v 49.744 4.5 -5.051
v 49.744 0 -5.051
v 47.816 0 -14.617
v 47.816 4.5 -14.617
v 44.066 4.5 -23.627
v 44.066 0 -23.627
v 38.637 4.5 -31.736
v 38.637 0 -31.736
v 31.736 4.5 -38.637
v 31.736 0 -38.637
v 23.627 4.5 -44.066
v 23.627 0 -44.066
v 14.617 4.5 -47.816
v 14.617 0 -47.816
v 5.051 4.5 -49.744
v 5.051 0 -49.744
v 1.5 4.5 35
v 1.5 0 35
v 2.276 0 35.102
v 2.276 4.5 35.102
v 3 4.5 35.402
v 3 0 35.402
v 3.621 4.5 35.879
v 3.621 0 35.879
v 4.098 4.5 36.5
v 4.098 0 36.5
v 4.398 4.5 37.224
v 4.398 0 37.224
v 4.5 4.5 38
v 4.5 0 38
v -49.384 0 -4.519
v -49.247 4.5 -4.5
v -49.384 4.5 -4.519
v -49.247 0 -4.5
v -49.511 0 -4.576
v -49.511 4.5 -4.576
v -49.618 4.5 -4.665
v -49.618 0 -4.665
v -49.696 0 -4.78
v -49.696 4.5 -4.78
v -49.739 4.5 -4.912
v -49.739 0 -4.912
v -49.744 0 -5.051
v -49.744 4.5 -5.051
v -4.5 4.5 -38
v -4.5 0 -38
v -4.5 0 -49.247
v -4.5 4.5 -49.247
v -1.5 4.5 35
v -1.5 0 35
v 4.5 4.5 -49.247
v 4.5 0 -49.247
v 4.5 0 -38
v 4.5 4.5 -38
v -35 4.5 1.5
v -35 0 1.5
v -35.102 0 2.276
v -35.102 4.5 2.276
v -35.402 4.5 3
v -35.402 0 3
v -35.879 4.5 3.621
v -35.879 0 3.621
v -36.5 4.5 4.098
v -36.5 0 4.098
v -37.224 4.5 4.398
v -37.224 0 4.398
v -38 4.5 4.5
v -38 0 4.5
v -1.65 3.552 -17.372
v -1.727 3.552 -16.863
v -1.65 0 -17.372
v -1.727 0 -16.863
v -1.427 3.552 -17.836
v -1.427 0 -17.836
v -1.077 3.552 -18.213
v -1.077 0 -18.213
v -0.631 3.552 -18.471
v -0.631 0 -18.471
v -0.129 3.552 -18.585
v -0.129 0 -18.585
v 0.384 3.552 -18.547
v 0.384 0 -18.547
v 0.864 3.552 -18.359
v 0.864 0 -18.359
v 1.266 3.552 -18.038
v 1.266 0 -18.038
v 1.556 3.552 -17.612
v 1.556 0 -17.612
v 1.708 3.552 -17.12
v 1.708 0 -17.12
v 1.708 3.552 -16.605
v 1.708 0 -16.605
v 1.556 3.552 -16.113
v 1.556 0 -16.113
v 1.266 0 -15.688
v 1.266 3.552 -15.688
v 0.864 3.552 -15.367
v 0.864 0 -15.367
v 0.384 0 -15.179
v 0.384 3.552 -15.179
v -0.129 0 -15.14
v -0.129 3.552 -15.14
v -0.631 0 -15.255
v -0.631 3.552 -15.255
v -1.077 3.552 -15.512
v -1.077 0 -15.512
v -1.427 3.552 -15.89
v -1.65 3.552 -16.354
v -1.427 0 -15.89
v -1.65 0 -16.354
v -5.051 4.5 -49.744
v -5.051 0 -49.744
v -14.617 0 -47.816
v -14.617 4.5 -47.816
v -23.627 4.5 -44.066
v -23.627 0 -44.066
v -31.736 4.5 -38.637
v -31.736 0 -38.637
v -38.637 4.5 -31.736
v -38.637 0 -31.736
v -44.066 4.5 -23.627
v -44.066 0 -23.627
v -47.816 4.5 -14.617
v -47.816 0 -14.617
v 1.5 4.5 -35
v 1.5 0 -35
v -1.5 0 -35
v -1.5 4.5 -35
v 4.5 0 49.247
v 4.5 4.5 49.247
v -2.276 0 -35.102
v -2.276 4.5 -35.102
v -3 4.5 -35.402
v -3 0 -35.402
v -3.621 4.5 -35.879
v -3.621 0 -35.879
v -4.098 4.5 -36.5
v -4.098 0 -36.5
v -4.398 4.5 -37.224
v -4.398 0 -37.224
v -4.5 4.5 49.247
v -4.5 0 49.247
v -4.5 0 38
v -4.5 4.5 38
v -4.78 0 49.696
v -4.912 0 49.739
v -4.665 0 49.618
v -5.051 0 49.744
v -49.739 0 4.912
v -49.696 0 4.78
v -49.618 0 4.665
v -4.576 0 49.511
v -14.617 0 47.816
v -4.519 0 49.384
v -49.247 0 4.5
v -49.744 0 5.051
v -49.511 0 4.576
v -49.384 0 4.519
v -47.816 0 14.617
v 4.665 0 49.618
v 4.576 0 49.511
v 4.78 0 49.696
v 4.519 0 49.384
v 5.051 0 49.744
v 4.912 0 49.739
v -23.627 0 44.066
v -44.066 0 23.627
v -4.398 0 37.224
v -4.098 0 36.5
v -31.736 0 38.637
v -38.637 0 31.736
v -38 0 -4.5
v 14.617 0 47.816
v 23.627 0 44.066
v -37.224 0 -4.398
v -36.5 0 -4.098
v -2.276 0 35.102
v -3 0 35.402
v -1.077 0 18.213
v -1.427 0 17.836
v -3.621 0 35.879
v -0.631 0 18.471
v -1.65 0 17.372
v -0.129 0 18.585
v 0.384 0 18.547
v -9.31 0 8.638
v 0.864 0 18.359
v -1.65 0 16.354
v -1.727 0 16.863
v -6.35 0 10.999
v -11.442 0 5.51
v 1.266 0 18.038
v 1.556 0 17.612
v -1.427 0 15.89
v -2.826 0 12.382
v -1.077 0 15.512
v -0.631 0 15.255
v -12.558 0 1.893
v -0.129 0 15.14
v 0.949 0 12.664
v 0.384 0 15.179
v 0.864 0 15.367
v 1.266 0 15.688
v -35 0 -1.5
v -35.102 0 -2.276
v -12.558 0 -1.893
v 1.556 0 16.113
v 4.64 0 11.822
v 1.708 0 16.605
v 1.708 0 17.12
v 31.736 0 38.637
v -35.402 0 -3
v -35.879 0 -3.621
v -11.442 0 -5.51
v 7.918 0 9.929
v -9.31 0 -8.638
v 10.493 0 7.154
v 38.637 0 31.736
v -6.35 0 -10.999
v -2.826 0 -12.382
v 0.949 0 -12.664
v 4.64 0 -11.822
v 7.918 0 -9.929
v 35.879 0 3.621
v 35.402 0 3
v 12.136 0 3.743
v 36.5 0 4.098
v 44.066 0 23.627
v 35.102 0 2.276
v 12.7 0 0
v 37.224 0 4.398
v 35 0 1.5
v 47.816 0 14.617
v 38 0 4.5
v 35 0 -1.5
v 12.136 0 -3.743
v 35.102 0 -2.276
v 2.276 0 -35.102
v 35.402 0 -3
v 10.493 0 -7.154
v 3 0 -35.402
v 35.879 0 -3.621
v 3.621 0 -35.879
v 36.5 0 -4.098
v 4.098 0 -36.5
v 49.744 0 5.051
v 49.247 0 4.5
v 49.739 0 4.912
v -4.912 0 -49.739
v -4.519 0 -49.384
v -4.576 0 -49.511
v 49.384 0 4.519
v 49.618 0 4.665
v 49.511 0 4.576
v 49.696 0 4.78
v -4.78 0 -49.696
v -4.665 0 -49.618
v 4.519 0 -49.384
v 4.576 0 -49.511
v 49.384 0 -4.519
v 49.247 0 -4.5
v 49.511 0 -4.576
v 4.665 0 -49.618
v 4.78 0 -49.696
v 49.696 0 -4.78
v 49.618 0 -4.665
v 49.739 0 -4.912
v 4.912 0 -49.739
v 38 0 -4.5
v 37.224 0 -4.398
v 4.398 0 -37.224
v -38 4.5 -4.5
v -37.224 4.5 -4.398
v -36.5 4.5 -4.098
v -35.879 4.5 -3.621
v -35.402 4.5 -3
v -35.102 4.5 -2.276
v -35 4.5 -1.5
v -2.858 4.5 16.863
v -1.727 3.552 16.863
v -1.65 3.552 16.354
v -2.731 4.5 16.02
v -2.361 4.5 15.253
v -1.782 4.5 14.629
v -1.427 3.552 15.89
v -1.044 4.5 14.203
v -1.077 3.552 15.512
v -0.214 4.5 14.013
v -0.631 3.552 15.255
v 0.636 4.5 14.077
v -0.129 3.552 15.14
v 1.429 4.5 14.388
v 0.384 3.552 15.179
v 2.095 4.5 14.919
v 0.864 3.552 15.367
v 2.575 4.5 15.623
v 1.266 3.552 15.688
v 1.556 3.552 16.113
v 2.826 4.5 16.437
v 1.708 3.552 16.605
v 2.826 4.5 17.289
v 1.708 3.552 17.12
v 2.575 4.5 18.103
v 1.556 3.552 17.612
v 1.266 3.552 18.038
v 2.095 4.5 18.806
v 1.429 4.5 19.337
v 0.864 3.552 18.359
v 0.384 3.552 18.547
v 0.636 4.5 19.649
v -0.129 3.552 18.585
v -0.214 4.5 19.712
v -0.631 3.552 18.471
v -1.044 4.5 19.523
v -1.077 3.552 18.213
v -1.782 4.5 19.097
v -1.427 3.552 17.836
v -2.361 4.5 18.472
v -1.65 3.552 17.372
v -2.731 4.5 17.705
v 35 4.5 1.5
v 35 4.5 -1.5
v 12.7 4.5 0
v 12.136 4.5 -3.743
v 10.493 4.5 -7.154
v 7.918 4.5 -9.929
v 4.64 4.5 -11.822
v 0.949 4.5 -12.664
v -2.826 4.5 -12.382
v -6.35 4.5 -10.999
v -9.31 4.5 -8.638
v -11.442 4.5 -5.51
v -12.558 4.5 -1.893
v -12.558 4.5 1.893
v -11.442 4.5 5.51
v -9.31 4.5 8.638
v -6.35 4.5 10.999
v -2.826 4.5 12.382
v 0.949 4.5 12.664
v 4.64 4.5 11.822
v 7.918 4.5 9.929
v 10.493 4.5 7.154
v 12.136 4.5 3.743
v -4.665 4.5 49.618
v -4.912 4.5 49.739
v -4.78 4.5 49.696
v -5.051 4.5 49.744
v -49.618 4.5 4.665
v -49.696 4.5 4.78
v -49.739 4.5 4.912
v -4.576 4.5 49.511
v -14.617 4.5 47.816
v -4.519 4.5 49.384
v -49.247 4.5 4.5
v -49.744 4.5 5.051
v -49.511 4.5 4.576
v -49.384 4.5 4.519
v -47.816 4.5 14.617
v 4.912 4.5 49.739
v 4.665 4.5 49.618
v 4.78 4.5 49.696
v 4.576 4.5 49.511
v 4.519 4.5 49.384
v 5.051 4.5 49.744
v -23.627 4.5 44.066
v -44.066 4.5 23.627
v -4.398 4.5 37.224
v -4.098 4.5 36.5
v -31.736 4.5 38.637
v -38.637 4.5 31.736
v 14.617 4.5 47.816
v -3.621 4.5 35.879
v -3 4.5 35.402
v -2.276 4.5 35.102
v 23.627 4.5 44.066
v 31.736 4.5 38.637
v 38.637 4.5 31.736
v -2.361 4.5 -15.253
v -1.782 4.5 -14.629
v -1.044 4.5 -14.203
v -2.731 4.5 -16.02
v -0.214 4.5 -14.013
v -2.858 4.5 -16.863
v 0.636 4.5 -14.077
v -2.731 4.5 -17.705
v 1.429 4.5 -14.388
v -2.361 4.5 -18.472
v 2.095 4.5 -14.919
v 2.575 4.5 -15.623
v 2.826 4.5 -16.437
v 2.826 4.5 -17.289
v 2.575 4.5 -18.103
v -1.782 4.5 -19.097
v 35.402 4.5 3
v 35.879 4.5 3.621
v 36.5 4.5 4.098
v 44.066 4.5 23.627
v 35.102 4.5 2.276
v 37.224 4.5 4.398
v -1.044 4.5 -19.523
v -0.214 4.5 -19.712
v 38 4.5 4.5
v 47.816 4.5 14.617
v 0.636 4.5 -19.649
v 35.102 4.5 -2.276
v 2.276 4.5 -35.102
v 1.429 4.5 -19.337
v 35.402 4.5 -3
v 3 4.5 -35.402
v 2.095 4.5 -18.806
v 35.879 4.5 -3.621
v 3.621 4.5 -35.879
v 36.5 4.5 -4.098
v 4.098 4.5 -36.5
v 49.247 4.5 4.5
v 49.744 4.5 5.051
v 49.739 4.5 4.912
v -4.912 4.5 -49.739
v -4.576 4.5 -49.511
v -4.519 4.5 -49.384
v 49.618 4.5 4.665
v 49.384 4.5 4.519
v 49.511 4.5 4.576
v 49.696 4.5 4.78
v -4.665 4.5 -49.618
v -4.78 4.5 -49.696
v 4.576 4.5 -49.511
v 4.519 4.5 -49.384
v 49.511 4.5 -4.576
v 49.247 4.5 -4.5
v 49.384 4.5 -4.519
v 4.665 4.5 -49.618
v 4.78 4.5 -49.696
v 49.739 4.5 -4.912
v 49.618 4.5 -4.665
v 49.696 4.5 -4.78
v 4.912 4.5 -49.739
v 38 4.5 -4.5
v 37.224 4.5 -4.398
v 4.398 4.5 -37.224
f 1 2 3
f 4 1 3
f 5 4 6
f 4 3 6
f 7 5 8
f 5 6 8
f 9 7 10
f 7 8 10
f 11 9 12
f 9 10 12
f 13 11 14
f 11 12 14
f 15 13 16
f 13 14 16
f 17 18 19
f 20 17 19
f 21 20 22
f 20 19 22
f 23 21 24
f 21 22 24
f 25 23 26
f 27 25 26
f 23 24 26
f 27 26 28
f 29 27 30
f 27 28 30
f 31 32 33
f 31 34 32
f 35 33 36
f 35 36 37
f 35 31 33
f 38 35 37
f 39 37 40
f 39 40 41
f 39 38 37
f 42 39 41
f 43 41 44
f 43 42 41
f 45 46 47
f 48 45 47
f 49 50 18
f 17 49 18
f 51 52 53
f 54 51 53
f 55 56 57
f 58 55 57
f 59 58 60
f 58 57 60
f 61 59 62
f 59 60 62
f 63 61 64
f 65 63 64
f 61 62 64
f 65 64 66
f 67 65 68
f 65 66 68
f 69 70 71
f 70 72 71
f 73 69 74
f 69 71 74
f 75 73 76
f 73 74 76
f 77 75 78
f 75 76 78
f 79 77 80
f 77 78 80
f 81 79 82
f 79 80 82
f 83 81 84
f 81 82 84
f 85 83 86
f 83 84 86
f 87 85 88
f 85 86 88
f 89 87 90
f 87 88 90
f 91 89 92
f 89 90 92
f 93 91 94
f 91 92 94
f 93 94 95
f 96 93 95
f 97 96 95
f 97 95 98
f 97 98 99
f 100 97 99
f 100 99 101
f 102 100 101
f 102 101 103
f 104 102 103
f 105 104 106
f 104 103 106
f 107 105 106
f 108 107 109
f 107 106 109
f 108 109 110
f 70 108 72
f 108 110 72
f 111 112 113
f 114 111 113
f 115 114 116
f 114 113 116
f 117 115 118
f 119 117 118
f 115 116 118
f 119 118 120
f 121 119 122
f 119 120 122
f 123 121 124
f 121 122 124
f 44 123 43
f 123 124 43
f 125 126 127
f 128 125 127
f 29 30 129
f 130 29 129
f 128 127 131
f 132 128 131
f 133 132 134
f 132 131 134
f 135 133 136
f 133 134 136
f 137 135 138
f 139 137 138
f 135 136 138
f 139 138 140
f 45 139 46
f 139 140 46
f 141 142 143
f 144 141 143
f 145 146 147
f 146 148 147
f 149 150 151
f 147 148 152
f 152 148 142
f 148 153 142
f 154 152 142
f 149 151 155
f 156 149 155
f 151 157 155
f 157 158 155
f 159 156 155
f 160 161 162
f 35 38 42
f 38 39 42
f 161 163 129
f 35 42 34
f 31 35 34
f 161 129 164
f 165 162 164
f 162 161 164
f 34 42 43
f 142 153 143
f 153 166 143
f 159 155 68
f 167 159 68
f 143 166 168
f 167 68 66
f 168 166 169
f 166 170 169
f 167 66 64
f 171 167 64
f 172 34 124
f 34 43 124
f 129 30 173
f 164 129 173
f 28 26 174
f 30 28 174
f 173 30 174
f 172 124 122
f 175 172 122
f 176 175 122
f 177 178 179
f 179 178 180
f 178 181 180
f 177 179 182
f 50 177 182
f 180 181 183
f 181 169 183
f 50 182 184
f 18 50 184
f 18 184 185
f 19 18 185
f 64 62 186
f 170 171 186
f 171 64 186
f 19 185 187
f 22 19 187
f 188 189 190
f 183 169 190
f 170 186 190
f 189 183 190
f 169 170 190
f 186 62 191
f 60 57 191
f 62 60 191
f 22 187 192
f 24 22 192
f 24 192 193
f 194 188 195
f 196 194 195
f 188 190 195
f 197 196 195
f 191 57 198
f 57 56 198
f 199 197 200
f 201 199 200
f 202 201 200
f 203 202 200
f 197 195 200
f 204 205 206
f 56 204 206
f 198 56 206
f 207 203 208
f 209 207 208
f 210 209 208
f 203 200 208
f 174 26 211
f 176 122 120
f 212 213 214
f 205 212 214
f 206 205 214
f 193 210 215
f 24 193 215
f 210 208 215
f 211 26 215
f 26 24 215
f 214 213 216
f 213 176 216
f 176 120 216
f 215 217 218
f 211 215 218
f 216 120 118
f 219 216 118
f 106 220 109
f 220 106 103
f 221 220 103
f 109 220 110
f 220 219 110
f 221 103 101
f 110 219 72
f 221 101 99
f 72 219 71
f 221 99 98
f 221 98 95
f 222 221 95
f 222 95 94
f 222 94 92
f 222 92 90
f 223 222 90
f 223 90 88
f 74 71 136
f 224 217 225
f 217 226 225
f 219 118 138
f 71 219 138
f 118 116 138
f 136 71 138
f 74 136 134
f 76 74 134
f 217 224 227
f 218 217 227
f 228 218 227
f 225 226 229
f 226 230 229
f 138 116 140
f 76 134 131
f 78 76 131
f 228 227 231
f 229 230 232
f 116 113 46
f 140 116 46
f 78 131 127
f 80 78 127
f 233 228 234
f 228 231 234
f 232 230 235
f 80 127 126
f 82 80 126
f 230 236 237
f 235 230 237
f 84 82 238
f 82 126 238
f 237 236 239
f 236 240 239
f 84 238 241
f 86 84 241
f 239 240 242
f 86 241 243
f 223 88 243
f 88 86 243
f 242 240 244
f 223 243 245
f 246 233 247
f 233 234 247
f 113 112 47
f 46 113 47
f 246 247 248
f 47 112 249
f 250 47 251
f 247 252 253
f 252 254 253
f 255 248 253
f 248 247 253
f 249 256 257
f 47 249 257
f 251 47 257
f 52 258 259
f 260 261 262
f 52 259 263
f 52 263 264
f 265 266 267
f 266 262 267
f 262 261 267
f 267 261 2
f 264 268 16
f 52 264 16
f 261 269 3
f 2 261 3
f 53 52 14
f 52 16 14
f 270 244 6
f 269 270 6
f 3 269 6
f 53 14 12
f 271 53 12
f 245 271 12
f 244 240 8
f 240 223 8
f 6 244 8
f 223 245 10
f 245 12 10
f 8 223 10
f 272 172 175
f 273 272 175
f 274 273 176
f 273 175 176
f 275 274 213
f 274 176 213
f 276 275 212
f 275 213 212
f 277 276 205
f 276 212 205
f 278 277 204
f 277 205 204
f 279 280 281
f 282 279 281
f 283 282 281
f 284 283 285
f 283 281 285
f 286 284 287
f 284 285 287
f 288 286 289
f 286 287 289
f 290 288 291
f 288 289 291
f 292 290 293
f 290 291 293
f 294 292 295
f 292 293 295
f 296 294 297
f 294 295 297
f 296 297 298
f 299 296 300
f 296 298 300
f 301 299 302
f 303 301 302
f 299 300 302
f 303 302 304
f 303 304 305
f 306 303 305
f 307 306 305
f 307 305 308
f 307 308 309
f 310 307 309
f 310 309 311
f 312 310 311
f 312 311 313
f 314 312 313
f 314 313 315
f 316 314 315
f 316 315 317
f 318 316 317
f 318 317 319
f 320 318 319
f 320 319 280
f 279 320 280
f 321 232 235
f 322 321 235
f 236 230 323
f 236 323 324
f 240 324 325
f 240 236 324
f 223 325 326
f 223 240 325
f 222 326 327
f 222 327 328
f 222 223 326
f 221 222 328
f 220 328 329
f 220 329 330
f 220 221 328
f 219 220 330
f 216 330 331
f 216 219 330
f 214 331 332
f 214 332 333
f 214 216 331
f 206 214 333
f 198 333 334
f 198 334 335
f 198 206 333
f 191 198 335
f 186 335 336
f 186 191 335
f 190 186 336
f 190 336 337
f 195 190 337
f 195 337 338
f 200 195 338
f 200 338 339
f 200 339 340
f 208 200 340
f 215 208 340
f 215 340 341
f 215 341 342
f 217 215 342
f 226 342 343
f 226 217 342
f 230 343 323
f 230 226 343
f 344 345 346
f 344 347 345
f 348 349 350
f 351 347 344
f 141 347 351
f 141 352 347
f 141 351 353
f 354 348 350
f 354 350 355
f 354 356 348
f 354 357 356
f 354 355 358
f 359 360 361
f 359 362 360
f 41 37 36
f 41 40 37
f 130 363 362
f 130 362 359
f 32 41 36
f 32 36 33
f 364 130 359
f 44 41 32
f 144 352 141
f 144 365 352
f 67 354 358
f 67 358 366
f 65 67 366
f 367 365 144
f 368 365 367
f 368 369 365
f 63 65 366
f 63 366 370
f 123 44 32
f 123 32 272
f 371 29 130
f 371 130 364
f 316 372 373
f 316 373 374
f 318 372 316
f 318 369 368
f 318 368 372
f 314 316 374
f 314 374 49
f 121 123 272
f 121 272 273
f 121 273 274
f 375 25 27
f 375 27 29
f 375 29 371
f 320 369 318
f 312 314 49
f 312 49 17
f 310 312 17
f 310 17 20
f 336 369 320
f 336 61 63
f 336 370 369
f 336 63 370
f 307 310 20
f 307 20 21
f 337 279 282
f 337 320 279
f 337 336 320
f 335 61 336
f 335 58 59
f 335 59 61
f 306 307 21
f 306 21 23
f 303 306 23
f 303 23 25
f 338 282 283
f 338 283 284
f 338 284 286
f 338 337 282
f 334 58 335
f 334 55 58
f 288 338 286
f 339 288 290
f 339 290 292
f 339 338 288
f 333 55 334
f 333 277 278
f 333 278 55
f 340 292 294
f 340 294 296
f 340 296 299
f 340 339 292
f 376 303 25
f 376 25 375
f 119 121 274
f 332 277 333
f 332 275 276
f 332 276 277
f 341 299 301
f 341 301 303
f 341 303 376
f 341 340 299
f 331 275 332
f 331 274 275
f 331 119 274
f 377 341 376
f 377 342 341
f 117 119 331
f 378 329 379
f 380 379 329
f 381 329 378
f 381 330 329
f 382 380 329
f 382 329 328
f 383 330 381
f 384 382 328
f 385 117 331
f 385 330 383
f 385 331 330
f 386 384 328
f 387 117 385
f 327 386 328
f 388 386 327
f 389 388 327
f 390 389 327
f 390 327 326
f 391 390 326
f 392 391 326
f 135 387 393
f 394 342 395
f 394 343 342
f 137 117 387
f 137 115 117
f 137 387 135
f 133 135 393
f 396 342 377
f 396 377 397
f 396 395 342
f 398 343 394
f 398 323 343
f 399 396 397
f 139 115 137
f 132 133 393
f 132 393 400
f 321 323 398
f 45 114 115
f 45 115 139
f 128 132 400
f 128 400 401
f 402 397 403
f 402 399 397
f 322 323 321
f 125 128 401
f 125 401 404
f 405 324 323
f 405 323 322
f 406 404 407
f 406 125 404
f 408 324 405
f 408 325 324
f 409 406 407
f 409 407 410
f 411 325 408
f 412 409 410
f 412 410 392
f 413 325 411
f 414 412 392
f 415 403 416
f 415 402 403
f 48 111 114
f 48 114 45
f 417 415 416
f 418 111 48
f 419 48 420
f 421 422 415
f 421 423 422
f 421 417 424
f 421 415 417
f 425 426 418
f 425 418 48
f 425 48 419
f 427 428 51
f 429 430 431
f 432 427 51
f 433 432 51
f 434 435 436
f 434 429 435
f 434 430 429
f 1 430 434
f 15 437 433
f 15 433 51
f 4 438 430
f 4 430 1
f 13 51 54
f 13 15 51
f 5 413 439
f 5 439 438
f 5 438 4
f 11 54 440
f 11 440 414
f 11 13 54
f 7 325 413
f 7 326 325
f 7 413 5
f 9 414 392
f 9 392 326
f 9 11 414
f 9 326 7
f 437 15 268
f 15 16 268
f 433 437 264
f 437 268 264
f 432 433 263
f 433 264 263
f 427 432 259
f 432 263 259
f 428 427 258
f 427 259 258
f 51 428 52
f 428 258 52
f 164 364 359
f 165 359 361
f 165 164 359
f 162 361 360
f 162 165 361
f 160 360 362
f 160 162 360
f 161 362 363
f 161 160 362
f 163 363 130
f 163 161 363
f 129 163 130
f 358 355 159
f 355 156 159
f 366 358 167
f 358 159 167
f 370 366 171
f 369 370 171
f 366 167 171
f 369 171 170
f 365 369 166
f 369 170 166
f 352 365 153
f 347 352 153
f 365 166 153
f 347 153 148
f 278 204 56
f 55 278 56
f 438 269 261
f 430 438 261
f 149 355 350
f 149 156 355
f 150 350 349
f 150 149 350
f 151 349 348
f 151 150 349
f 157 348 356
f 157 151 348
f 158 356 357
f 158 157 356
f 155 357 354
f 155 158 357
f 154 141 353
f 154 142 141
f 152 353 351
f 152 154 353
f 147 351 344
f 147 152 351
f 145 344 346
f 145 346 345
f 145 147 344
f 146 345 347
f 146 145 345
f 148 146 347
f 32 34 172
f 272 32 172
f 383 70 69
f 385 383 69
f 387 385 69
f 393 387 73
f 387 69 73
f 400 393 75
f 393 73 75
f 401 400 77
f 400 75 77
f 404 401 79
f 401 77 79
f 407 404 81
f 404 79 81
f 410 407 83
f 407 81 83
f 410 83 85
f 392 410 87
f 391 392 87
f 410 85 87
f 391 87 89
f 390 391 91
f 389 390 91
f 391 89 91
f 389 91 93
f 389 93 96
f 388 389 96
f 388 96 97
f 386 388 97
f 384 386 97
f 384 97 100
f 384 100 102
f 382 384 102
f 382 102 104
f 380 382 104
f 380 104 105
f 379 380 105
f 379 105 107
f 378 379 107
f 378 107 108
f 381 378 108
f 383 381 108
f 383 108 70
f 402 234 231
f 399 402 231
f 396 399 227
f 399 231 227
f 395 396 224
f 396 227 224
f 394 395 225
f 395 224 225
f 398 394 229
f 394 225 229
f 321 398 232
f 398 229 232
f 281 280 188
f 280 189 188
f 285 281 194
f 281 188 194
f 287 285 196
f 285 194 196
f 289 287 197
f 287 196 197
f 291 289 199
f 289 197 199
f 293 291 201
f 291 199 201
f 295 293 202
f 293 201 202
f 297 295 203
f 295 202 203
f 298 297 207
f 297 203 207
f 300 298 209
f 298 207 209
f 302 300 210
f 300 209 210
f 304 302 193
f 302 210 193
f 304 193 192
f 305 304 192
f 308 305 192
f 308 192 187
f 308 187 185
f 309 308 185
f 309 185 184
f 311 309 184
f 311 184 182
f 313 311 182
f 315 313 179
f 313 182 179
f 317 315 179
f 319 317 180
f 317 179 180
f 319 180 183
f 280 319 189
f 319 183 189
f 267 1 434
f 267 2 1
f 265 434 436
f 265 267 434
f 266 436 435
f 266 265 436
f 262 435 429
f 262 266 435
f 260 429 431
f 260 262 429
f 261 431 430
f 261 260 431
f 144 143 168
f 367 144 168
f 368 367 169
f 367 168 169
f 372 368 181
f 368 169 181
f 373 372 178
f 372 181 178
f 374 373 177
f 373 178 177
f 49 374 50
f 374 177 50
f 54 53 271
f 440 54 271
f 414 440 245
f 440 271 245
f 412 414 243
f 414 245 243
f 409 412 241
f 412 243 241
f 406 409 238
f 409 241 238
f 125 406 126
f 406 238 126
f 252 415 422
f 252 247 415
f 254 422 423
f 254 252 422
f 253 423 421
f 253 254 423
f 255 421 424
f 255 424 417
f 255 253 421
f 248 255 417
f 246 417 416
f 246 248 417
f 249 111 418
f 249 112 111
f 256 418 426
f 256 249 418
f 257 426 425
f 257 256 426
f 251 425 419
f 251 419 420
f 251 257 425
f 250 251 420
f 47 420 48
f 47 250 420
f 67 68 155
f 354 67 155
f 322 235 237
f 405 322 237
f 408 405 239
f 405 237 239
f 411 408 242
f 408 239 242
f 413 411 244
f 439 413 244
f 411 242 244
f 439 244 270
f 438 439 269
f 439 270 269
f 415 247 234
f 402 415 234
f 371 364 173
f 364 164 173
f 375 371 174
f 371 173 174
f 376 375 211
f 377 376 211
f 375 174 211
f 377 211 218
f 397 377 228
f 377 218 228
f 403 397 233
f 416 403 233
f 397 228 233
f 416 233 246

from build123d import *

# Parameters (mm, degrees)
SKETCH3_R                                         = 50
SKETCH3_R_2                                       = 12.7
BOSS_EXTRUDE4_DEPTH                               = 4.5
CUT_EXTRUDE18_DEPTH                               = 10
FILLET2_R                                         = 0.5
CSK_FOR_4_FLAT_HEAD_MACHINE_SCREW_100_D           = 3.4544
CSK_FOR_4_FLAT_HEAD_MACHINE_SCREW_100_CSINK_D     = 5.715
CSK_FOR_4_FLAT_HEAD_MACHINE_SCREW_100_CSINK_ANGLE = 100


with BuildPart() as part:
    # Sketch3 → Boss-Extrude4 (new body)
    with BuildSketch(Plane(origin=(0, 0, 0), x_dir=(1, 0, 0), z_dir=(0, 1, 0))):
        Circle(SKETCH3_R)
        Circle(SKETCH3_R_2, mode=Mode.SUBTRACT)
    extrude(amount=BOSS_EXTRUDE4_DEPTH)

    # Sketch6 → Cut-Extrude18 (cut)
    with BuildSketch(Plane(origin=(0, 0, 0), x_dir=(1, 0, 0), z_dir=(0, 1, 0))):
        with BuildLine():
            Line((-38, -4.5), (-65, -4.5))
            Line((-65, -4.5), (-65, 4.5))
            Line((-65, 4.5), (-38, 4.5))
            ThreePointArc((-38, 4.5), (-35.878679656, 3.621320344), (-35, 1.5))
            Line((-35, 1.5), (-35, -1.5))
            ThreePointArc((-35, -1.5), (-35.878679656, -3.621320344), (-38, -4.5))
        make_face()
        with BuildLine():
            Line((-4.5, 38), (-4.5, 65))
            Line((-4.5, 65), (4.5, 65))
            Line((4.5, 65), (4.5, 38))
            ThreePointArc((4.5, 38), (3.621320344, 35.878679656), (1.5, 35))
            Line((1.5, 35), (-1.5, 35))
            ThreePointArc((-1.5, 35), (-3.621320344, 35.878679656), (-4.5, 38))
        make_face()
        with BuildLine():
            Line((38, 4.5), (65, 4.5))
            Line((65, 4.5), (65, -4.5))
            Line((65, -4.5), (38, -4.5))
            ThreePointArc((38, -4.5), (35.878679656, -3.621320344), (35, -1.5))
            Line((35, -1.5), (35, 1.5))
            ThreePointArc((35, 1.5), (35.878679656, 3.621320344), (38, 4.5))
        make_face()
        with BuildLine():
            Line((4.5, -38), (4.5, -65))
            Line((4.5, -65), (-4.5, -65))
            Line((-4.5, -65), (-4.5, -38))
            ThreePointArc((-4.5, -38), (-3.621320344, -35.878679656), (-1.5, -35))
            Line((-1.5, -35), (1.5, -35))
            ThreePointArc((1.5, -35), (3.621320344, -35.878679656), (4.5, -38))
        make_face()
    extrude(amount=CUT_EXTRUDE18_DEPTH, mode=Mode.SUBTRACT)

    # Fillet2
    fillet2_edges = [part.edges().sort_by_distance(p)[0] for p in [
        (-49.797088268, 2.25, -4.5),
        (-49.797088268, 2.25, 4.5),
        (4.5, 2.25, -49.797088268),
        (-4.5, 2.25, -49.797088268),
        (49.797088268, 2.25, 4.5),
        (49.797088268, 2.25, -4.5),
        (-4.5, 2.25, 49.797088268),
        (4.5, 2.25, 49.797088268),
    ]]
    fillet(fillet2_edges, radius=FILLET2_R)

    # CSK for #4 Flat Head Machine Screw (100)1 (through all)
    with Locations(Plane(origin=(0, 4.5, 0), x_dir=(1, 0, 0), z_dir=(0, 1, 0))):
        with Locations((0, -16.862709614), (0, 16.862709614)):
            CounterSinkHole(CSK_FOR_4_FLAT_HEAD_MACHINE_SCREW_100_D / 2, CSK_FOR_4_FLAT_HEAD_MACHINE_SCREW_100_CSINK_D / 2, counter_sink_angle=CSK_FOR_4_FLAT_HEAD_MACHINE_SCREW_100_CSINK_ANGLE)


solid = part.part
